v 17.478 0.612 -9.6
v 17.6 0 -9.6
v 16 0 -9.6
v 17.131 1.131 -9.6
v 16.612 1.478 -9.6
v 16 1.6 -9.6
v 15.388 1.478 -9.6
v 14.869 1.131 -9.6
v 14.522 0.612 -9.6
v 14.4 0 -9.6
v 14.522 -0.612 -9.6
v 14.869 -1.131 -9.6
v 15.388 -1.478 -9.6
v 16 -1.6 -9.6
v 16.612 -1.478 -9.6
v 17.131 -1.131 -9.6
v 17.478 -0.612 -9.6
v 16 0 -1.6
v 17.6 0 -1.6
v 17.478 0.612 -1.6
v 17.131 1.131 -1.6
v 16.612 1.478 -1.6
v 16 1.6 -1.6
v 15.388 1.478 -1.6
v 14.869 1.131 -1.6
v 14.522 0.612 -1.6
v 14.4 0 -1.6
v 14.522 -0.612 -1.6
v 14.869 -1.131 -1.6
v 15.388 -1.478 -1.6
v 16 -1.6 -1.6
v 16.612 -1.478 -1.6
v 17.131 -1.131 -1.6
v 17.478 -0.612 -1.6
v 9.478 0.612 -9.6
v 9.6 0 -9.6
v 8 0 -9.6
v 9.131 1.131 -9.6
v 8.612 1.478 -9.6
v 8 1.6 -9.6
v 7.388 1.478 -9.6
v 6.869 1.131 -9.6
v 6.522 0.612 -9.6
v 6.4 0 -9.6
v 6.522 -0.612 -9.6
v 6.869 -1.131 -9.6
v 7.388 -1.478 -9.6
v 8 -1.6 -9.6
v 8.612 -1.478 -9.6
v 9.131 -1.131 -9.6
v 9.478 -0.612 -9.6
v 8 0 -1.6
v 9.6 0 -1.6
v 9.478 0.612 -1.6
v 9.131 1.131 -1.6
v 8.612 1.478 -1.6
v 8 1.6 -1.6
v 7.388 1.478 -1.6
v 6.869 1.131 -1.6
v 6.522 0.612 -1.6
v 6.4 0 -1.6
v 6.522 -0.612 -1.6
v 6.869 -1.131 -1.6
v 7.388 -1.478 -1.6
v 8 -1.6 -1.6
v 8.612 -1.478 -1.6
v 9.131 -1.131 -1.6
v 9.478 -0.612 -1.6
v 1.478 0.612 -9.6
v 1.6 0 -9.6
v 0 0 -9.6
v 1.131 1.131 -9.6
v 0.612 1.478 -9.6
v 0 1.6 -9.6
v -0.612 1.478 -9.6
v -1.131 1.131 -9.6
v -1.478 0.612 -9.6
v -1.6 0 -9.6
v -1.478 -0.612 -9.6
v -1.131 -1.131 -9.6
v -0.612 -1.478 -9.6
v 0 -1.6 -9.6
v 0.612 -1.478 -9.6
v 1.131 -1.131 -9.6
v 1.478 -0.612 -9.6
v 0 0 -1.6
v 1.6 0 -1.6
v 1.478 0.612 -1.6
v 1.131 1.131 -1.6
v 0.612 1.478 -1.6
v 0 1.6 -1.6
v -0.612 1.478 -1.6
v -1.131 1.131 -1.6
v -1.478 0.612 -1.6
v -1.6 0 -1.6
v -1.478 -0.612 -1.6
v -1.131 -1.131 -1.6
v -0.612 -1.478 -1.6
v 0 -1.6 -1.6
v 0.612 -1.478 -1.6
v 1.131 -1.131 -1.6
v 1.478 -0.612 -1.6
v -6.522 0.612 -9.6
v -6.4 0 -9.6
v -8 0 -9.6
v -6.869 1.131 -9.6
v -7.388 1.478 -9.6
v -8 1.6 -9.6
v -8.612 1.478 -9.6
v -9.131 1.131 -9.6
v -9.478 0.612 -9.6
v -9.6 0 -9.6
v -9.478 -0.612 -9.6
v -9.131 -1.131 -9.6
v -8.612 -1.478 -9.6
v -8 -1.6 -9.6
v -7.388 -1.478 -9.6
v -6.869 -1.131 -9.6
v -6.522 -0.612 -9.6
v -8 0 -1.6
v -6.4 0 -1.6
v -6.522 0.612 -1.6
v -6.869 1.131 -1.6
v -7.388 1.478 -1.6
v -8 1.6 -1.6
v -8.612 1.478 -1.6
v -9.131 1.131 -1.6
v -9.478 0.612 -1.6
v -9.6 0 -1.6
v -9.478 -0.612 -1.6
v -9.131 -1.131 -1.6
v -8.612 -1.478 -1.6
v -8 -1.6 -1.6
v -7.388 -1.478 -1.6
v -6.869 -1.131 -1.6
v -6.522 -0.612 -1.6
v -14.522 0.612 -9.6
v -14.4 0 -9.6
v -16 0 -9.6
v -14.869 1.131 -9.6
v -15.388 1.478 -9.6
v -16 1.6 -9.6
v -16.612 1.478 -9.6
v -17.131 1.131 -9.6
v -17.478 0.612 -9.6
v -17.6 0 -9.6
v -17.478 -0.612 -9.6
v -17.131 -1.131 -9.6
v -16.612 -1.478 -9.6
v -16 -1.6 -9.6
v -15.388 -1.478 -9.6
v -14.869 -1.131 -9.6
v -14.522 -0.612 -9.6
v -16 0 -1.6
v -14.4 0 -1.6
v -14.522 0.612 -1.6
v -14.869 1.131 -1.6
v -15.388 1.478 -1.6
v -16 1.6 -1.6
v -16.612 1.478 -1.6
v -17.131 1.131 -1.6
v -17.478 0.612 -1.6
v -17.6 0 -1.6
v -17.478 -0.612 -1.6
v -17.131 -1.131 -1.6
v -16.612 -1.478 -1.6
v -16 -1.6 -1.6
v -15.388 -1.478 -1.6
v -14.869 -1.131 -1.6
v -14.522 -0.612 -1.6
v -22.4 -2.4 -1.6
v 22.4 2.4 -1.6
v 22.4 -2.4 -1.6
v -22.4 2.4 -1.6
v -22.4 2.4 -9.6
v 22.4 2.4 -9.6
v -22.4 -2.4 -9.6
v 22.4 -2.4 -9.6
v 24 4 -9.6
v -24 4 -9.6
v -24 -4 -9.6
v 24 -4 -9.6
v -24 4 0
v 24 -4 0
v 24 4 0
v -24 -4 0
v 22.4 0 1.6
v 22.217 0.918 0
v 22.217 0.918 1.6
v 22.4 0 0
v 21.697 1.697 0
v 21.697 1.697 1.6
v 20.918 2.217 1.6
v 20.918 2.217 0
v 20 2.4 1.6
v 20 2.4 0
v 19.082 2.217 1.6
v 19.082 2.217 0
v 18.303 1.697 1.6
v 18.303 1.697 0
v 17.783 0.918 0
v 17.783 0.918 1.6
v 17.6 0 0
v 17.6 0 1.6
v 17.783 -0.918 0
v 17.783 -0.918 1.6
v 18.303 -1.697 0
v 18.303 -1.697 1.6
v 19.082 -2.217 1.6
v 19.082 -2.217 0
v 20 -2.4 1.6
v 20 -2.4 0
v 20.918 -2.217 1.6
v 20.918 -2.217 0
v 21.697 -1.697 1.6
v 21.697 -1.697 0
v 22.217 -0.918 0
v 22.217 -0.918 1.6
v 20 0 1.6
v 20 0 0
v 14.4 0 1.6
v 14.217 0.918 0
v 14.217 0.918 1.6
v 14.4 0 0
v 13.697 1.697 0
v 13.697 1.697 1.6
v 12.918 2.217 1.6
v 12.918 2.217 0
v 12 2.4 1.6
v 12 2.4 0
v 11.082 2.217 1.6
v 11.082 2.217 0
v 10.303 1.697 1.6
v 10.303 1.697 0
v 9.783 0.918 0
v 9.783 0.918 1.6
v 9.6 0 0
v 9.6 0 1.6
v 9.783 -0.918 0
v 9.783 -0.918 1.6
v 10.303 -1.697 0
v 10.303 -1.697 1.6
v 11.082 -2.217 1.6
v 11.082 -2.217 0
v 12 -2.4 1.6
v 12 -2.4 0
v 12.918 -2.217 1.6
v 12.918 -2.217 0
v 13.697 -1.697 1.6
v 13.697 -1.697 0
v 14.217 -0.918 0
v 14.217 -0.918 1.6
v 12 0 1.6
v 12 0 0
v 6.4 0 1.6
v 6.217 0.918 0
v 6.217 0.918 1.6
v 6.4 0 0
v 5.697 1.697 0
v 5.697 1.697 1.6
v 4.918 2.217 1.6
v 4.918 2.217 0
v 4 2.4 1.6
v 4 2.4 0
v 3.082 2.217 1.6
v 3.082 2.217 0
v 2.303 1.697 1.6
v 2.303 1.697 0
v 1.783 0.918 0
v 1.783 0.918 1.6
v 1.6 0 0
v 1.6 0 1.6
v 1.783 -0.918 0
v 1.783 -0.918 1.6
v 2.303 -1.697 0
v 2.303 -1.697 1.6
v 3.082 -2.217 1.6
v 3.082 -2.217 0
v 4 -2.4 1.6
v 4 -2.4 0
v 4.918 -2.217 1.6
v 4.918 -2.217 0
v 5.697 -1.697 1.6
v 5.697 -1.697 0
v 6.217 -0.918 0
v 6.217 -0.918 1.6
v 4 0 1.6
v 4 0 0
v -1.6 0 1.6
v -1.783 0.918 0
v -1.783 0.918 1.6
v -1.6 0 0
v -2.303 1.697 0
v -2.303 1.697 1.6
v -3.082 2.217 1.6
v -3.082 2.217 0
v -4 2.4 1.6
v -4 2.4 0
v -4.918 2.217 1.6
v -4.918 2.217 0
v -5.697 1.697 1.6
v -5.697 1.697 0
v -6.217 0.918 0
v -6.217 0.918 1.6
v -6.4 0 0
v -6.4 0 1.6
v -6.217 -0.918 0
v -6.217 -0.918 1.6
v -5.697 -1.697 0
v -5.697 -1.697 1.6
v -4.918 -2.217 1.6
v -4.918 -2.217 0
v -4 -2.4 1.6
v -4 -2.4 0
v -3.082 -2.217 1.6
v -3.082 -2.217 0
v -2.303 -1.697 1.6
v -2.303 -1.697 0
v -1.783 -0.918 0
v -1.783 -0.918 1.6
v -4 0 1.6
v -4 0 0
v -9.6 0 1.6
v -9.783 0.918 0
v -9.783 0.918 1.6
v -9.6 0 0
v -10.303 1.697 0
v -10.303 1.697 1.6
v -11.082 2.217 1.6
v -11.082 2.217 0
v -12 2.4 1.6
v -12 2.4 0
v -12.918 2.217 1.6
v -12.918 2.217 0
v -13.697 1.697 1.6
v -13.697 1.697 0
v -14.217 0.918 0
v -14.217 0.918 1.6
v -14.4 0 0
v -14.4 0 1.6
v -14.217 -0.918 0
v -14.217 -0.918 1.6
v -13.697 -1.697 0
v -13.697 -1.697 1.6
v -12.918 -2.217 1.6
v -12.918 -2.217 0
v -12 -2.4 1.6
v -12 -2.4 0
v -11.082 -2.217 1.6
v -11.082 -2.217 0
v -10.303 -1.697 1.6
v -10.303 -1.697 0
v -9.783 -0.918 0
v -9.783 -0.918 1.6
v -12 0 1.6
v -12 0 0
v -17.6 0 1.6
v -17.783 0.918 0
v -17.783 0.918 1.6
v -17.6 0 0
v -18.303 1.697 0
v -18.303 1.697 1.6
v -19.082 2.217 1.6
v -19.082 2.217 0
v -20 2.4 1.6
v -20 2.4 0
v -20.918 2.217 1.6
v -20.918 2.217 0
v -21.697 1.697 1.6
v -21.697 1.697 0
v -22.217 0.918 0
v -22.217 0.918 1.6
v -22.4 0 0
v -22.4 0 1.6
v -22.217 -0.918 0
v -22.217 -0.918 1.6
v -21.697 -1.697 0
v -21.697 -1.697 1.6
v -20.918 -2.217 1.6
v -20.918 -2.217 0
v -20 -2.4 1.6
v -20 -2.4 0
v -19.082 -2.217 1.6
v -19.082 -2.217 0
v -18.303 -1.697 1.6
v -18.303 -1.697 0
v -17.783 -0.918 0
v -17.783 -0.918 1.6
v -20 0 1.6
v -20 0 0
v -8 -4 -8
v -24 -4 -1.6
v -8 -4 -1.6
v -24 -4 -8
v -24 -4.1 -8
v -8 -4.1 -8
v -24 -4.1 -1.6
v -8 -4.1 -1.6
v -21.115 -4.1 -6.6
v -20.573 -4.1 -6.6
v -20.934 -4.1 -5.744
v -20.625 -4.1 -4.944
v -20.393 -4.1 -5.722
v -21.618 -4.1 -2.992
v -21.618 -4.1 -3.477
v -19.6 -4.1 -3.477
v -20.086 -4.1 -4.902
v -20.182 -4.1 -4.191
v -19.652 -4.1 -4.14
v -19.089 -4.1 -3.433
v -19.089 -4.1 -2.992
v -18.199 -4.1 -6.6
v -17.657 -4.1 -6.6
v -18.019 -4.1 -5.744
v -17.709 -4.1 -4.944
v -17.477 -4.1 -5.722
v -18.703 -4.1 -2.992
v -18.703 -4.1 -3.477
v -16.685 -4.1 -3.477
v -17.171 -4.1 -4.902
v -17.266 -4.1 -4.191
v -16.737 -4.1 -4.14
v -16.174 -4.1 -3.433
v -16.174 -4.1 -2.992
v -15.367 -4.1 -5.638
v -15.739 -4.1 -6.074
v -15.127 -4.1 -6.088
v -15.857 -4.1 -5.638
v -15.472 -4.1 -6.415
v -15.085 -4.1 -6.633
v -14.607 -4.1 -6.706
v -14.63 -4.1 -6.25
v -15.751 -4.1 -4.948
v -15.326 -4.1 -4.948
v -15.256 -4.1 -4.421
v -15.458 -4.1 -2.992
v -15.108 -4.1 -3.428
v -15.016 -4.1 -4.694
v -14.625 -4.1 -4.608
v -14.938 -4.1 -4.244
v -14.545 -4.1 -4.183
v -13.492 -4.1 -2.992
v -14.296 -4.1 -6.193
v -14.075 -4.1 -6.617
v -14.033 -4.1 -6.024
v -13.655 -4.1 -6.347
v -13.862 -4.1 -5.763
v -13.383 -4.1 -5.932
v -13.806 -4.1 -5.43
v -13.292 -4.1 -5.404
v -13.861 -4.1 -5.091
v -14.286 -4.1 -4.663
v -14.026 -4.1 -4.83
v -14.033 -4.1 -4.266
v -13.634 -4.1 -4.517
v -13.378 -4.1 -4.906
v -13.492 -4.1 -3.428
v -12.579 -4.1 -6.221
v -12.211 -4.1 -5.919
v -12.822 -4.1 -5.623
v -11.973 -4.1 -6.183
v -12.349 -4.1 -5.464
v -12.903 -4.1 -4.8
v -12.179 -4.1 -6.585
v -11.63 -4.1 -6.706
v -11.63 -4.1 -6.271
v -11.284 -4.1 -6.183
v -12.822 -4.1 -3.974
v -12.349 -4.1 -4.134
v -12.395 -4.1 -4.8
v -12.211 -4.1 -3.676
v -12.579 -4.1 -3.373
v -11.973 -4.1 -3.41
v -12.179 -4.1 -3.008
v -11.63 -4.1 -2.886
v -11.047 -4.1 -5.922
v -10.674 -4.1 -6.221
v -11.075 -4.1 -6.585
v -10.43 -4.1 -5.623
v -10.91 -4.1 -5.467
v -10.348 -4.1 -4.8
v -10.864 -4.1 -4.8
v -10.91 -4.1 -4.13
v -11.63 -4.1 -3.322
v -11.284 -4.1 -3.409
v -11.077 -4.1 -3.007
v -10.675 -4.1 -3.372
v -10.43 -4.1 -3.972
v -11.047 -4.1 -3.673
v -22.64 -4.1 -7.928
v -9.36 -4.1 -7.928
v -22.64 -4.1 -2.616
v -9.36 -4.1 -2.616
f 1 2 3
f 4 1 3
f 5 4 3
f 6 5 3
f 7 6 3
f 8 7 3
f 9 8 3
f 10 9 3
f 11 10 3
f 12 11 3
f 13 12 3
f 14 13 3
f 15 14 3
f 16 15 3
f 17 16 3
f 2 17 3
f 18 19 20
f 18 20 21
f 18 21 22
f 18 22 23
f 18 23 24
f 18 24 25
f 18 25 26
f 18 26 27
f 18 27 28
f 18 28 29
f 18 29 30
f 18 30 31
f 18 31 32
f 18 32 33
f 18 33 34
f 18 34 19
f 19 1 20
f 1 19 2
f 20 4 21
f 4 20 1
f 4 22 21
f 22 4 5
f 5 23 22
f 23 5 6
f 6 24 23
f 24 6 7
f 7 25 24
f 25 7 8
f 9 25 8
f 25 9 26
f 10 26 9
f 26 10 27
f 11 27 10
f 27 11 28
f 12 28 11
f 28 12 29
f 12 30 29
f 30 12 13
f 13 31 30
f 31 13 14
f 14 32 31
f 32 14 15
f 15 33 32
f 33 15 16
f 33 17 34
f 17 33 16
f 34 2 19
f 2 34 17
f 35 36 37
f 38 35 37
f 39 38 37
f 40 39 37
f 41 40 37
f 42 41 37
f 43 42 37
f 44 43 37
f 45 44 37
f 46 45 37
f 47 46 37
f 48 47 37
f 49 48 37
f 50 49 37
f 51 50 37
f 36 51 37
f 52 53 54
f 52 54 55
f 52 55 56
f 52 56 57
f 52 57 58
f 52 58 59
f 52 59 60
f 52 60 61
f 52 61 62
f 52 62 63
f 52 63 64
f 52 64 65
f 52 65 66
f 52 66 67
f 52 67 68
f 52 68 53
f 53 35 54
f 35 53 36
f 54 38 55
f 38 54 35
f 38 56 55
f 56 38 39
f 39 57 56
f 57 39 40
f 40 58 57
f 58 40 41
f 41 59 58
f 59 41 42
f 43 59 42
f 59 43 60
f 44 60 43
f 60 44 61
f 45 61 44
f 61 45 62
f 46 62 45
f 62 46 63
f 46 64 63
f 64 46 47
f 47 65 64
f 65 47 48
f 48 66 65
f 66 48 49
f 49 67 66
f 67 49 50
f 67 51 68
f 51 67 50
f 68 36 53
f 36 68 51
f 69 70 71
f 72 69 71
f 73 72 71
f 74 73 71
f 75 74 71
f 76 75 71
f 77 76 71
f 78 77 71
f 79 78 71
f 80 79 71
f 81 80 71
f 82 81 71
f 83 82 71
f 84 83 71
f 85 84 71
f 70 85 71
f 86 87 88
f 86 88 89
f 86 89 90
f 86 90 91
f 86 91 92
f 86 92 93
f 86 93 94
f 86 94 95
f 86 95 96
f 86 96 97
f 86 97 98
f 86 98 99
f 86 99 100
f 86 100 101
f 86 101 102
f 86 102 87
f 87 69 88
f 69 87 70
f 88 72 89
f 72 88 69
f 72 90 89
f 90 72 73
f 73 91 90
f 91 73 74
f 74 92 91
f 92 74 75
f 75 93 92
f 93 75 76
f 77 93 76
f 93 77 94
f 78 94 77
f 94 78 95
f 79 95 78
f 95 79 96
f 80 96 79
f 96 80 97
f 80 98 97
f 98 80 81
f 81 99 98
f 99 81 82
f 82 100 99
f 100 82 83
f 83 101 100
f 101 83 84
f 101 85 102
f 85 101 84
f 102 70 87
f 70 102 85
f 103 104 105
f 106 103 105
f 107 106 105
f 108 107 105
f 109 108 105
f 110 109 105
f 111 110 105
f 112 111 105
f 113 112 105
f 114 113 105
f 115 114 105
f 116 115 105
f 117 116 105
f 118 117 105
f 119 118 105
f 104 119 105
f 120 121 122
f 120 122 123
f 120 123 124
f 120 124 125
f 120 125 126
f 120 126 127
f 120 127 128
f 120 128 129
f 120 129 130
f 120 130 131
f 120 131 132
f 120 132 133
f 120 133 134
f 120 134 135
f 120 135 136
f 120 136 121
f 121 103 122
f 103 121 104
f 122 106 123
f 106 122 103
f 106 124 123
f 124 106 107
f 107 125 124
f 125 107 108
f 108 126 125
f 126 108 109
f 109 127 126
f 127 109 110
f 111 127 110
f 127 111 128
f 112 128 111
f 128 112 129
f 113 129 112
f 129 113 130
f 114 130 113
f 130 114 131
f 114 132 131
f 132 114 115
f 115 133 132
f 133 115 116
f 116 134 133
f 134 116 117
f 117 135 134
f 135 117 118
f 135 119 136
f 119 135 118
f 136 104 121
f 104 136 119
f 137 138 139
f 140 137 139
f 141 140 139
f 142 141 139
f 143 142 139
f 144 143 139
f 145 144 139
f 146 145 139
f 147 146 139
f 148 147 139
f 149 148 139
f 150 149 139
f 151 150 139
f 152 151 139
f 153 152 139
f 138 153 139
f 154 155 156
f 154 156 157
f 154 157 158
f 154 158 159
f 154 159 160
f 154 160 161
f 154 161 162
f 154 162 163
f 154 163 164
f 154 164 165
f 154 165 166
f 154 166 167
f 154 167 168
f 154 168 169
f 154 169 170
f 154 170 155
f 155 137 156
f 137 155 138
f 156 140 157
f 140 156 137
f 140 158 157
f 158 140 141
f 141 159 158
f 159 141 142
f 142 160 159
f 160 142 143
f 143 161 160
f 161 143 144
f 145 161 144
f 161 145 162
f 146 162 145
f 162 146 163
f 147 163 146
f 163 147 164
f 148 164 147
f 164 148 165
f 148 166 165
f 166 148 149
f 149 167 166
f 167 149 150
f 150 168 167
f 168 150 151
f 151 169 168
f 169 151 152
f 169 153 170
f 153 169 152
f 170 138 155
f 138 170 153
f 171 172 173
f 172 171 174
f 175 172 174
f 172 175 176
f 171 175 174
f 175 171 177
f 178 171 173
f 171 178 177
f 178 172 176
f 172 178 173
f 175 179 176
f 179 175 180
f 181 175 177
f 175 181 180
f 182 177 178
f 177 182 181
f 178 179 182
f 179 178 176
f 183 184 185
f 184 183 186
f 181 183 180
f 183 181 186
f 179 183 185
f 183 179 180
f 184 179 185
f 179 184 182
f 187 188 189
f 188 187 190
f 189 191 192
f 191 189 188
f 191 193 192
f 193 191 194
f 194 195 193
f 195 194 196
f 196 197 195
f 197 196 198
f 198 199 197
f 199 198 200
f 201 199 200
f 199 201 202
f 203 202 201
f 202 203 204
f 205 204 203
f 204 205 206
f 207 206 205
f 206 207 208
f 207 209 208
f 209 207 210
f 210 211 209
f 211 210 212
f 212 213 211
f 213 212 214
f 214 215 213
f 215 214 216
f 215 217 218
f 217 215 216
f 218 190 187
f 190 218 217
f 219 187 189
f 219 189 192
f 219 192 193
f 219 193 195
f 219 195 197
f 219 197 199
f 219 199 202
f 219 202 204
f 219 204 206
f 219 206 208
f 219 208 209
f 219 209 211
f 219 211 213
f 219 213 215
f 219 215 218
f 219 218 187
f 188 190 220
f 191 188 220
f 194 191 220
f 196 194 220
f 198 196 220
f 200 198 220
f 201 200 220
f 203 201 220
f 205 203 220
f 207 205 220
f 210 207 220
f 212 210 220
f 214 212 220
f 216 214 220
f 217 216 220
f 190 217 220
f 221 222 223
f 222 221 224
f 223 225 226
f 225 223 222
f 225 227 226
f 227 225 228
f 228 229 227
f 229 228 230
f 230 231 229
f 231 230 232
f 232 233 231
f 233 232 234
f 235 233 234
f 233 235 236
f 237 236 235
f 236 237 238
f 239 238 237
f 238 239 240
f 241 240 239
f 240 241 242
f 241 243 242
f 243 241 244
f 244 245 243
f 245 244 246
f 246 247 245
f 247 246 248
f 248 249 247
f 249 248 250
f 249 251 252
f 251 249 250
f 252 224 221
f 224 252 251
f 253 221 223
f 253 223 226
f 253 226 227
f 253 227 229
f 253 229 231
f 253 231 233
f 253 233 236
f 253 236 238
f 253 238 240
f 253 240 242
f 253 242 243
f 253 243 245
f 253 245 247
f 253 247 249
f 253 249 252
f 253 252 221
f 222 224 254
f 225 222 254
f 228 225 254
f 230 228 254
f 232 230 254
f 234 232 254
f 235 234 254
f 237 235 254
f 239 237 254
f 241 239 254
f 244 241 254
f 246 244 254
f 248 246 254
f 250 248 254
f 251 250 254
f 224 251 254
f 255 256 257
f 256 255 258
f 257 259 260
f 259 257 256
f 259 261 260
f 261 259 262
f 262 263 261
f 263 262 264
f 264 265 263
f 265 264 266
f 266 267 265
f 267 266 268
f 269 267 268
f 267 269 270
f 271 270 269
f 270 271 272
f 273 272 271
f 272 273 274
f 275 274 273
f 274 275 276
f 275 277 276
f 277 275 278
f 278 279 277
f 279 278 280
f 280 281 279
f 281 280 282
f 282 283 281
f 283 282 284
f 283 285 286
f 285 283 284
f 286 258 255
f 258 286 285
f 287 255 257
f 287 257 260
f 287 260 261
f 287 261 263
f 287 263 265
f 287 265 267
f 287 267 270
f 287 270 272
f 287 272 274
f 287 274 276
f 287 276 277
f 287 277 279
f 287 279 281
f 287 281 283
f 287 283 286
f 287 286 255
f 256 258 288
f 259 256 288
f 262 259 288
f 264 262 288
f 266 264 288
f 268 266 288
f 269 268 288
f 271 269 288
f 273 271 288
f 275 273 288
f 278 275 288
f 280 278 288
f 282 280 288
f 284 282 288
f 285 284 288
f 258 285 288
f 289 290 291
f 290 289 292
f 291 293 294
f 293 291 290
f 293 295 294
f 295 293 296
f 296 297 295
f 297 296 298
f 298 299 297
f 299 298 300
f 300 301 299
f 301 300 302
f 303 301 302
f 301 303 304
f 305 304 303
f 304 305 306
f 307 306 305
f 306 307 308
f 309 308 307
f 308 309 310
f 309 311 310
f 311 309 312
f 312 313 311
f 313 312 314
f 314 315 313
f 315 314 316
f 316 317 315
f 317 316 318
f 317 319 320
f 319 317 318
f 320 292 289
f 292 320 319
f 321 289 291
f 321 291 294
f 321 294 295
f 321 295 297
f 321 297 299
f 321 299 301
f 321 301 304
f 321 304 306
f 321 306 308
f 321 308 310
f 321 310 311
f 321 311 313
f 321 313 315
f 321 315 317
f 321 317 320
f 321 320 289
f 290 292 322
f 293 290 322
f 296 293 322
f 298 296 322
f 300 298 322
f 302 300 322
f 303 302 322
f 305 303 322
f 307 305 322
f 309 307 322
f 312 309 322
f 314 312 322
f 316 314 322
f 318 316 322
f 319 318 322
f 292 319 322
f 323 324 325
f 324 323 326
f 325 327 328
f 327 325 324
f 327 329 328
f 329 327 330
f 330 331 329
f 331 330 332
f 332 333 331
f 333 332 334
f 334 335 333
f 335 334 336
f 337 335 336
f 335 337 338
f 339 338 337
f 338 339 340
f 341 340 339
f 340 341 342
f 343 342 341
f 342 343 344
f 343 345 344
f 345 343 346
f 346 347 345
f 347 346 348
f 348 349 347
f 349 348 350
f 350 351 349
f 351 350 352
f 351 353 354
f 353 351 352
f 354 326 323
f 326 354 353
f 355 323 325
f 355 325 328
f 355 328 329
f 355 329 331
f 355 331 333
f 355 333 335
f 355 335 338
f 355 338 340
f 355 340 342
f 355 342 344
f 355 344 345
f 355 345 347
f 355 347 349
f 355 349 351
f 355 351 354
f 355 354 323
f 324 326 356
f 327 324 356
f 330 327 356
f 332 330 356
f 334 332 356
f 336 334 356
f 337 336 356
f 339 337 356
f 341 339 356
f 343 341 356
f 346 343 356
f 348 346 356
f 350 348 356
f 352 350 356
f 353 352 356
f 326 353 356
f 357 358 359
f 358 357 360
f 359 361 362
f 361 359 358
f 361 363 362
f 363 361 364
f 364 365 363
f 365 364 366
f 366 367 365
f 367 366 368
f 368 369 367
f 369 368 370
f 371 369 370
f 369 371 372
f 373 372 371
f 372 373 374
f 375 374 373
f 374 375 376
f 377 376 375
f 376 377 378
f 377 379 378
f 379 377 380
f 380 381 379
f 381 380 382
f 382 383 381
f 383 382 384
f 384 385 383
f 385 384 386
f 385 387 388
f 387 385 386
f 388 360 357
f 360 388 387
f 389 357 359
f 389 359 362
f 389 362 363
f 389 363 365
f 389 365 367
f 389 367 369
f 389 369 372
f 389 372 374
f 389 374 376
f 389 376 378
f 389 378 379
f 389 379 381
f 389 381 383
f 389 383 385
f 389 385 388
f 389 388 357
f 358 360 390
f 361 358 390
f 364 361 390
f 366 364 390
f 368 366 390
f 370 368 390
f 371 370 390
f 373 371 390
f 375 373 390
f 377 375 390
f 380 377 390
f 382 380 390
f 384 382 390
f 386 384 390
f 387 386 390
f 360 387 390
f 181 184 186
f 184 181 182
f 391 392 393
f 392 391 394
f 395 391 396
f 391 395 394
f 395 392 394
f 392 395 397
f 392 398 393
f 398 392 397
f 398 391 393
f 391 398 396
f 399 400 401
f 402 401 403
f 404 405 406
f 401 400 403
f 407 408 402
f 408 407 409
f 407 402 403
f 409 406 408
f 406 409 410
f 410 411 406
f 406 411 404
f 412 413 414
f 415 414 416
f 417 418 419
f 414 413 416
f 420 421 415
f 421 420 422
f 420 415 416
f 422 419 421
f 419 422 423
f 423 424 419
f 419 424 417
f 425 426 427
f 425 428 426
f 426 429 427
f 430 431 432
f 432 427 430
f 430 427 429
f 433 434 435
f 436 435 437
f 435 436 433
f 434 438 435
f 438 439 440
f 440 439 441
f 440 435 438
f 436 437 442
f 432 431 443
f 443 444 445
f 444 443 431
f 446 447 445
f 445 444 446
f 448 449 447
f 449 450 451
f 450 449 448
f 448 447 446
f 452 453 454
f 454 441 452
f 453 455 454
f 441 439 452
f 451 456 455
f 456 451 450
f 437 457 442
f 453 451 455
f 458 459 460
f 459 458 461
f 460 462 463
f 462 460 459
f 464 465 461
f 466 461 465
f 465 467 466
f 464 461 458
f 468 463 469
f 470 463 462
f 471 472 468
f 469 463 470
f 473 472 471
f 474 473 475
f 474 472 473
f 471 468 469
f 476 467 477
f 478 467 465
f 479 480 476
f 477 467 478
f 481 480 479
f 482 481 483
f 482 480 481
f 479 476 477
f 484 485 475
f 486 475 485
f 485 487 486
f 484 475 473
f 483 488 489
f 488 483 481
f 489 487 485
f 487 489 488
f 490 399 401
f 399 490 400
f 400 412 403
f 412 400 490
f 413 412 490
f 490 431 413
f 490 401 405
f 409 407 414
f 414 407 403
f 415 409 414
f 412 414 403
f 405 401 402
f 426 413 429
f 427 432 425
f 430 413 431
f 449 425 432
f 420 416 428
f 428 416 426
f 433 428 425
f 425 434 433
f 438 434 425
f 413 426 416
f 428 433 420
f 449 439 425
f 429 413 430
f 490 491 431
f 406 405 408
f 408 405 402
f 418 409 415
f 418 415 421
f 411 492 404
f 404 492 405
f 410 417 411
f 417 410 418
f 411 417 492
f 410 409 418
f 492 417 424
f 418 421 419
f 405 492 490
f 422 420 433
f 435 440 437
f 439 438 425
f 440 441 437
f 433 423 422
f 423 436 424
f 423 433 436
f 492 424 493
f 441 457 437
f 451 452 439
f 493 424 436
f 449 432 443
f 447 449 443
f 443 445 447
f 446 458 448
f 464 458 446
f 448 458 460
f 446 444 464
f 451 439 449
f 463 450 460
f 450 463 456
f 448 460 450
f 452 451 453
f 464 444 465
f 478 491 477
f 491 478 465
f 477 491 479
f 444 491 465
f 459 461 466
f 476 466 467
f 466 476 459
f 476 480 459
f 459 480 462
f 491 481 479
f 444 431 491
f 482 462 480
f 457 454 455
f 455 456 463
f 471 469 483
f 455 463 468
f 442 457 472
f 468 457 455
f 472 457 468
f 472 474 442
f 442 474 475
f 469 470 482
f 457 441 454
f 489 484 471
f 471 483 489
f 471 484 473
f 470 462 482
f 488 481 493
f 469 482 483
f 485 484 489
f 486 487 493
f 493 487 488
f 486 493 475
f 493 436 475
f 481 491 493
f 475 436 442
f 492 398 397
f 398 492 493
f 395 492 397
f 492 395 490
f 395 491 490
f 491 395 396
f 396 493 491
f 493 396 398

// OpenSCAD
// file: ../p/4-4edge.scad
use <../lib.scad>
function ldraw_lib__4_4edge() = [
// 0 Circle 1.0
// 0 Name: 4-4edge.dat
// 0 Author: James Jessiman
// 0 !LDRAW_ORG Primitive UPDATE 2017-01
// 0 !LICENSE Licensed under CC BY 2.0 and CC BY 4.0 : see CAreadme.txt
// 
// 0 BFC CERTIFY CCW
  [0,"BFC","CERTIFY"],
  [0,"BFC","CCW"],
// 
// 0 !HISTORY 1998-12-15 [PTadmin] Official Update 1998-10
// 0 !HISTORY 2005-12-28 [PTadmin] Official Update 2005-01
// 0 !HISTORY 2007-06-24 [PTadmin] Header formatted for Contributor Agreement
// 0 !HISTORY 2008-07-01 [PTadmin] Official Update 2008-01
// 0 !HISTORY 2017-01-15 [Steffen] BFCed
// 0 !HISTORY 2017-12-30 [PTadmin] Official Update 2017-01
// 
// 
// 2 24 1 0 0 0.9239 0 0.3827
  [2,24,1,0,0,0.9239,0,0.3827],
// 2 24 0.9239 0 0.3827 0.7071 0 0.7071
  [2,24,0.9239,0,0.3827,0.7071,0,0.7071],
// 2 24 0.7071 0 0.7071 0.3827 0 0.9239
  [2,24,0.7071,0,0.7071,0.3827,0,0.9239],
// 2 24 0.3827 0 0.9239 0 0 1
  [2,24,0.3827,0,0.9239,0,0,1],
// 2 24 0 0 1 -0.3827 0 0.9239
  [2,24,0,0,1,-0.3827,0,0.9239],
// 2 24 -0.3827 0 0.9239 -0.7071 0 0.7071
  [2,24,-0.3827,0,0.9239,-0.7071,0,0.7071],
// 2 24 -0.7071 0 0.7071 -0.9239 0 0.3827
  [2,24,-0.7071,0,0.7071,-0.9239,0,0.3827],
// 2 24 -0.9239 0 0.3827 -1 0 -0
  [2,24,-0.9239,0,0.3827,-1,0,-0],
// 2 24 -1 0 -0 -0.9239 0 -0.3827
  [2,24,-1,0,-0,-0.9239,0,-0.3827],
// 2 24 -0.9239 0 -0.3827 -0.7071 0 -0.7071
  [2,24,-0.9239,0,-0.3827,-0.7071,0,-0.7071],
// 2 24 -0.7071 0 -0.7071 -0.3827 0 -0.9239
  [2,24,-0.7071,0,-0.7071,-0.3827,0,-0.9239],
// 2 24 -0.3827 0 -0.9239 0 0 -1
  [2,24,-0.3827,0,-0.9239,0,0,-1],
// 2 24 0 0 -1 0.3827 0 -0.9239
  [2,24,0,0,-1,0.3827,0,-0.9239],
// 2 24 0.3827 0 -0.9239 0.7071 0 -0.7071
  [2,24,0.3827,0,-0.9239,0.7071,0,-0.7071],
// 2 24 0.7071 0 -0.7071 0.9239 0 -0.3827
  [2,24,0.7071,0,-0.7071,0.9239,0,-0.3827],
// 2 24 0.9239 0 -0.3827 1 0 0
  [2,24,0.9239,0,-0.3827,1,0,0],
];
module ldraw_lib__4_4edge(step=0, col=false, unit=2/5, alt=false, line=0.2, solid=!$preview)
    makepoly(ldraw_lib__4_4edge(), step=step, col=col, unit=unit, alt=alt, line=line, solid=solid);
ldraw_lib__4_4edge(line=0.2);
// file: ../p/4-4disc.scad
use <../lib.scad>
function ldraw_lib__4_4disc() = [
// 0 Disc 1.0
// 0 Name: 4-4disc.dat
// 0 Author: James Jessiman
// 0 !LDRAW_ORG Primitive UPDATE 2002-02
// 0 !LICENSE Licensed under CC BY 2.0 and CC BY 4.0 : see CAreadme.txt
// 
// 0 BFC CERTIFY CCW
  [0,"BFC","CERTIFY"],
  [0,"BFC","CCW"],
// 
// 0 !HISTORY 1998-12-15 [PTadmin] Official Update 1998-10
// 0 !HISTORY 2002-03-23 [sbliss] Added BFC statement
// 0 !HISTORY 2002-04-25 [PTadmin] Official Update 2002-02
// 0 !HISTORY 2007-06-24 [PTadmin] Header formatted for Contributor Agreement
// 0 !HISTORY 2008-07-01 [PTadmin] Official Update 2008-01
// 
// 
// 3 16 0 0 0 1 0 0 0.9239 0 0.3827
  [3,16,0,0,0,1,0,0,0.9239,0,0.3827],
// 3 16 0 0 0 0.9239 0 0.3827 0.7071 0 0.7071
  [3,16,0,0,0,0.9239,0,0.3827,0.7071,0,0.7071],
// 3 16 0 0 0 0.7071 0 0.7071 0.3827 0 0.9239
  [3,16,0,0,0,0.7071,0,0.7071,0.3827,0,0.9239],
// 3 16 0 0 0 0.3827 0 0.9239 0 0 1
  [3,16,0,0,0,0.3827,0,0.9239,0,0,1],
// 3 16 0 0 0 0 0 1 -0.3827 0 0.9239
  [3,16,0,0,0,0,0,1,-0.3827,0,0.9239],
// 3 16 0 0 0 -0.3827 0 0.9239 -0.7071 0 0.7071
  [3,16,0,0,0,-0.3827,0,0.9239,-0.7071,0,0.7071],
// 3 16 0 0 0 -0.7071 0 0.7071 -0.9239 0 0.3827
  [3,16,0,0,0,-0.7071,0,0.7071,-0.9239,0,0.3827],
// 3 16 0 0 0 -0.9239 0 0.3827 -1 0 -0
  [3,16,0,0,0,-0.9239,0,0.3827,-1,0,-0],
// 3 16 0 0 0 -1 0 -0 -0.9239 0 -0.3827
  [3,16,0,0,0,-1,0,-0,-0.9239,0,-0.3827],
// 3 16 0 0 0 -0.9239 0 -0.3827 -0.7071 0 -0.7071
  [3,16,0,0,0,-0.9239,0,-0.3827,-0.7071,0,-0.7071],
// 3 16 0 0 0 -0.7071 0 -0.7071 -0.3827 0 -0.9239
  [3,16,0,0,0,-0.7071,0,-0.7071,-0.3827,0,-0.9239],
// 3 16 0 0 0 -0.3827 0 -0.9239 0 0 -1
  [3,16,0,0,0,-0.3827,0,-0.9239,0,0,-1],
// 3 16 0 0 0 0 0 -1 0.3827 0 -0.9239
  [3,16,0,0,0,0,0,-1,0.3827,0,-0.9239],
// 3 16 0 0 0 0.3827 0 -0.9239 0.7071 0 -0.7071
  [3,16,0,0,0,0.3827,0,-0.9239,0.7071,0,-0.7071],
// 3 16 0 0 0 0.7071 0 -0.7071 0.9239 0 -0.3827
  [3,16,0,0,0,0.7071,0,-0.7071,0.9239,0,-0.3827],
// 3 16 0 0 0 0.9239 0 -0.3827 1 0 0
  [3,16,0,0,0,0.9239,0,-0.3827,1,0,0],
// 0
];
module ldraw_lib__4_4disc(step=0, col=false, unit=2/5, alt=false, line=0.2, solid=!$preview)
    makepoly(ldraw_lib__4_4disc(), step=step, col=col, unit=unit, alt=alt, line=line, solid=solid);
ldraw_lib__4_4disc(line=0.2);
// file: ../p/4-4cyli.scad
use <../lib.scad>
$fa=1; $fs=0.2;
function ldraw_lib__4_4cyli(realsolid=false) = [
// 0 Cylinder 1.0
// 0 Name: 4-4cyli.dat
// 0 Author: James Jessiman
// 0 !LDRAW_ORG Primitive UPDATE 2005-01
// 0 !LICENSE Licensed under CC BY 2.0 and CC BY 4.0 : see CAreadme.txt
// 
// 0 BFC CERTIFY CCW
  [0,"BFC","CERTIFY"],
  [0,"BFC","CCW"],
// 
// 0 !HISTORY 1998-12-15 [PTadmin] Official Update 1998-10
// 0 !HISTORY 2002-03-23 [sbliss] Added BFC statement; merged headers from files in distributions LDraw 0.27 and Complete.
// 0 !HISTORY 2002-04-25 [PTadmin] Official Update 2002-02
// 0 !HISTORY 2004-12-14 [guyvivan] BFC CCW
// 0 !HISTORY 2005-12-28 [PTadmin] Official Update 2005-01
// 0 !HISTORY 2007-06-24 [PTadmin] Header formatted for Contributor Agreement
// 0 !HISTORY 2008-07-01 [PTadmin] Official Update 2008-01
// 
// 
// 4 16 1 1 0 0.9239 1 0.3827 0.9239 0 0.3827 1 0 0
  [4,16,1,1,0,0.9239,1,0.3827,0.9239,0,0.3827,1,0,0],
// 5 24 1 0 0 1 1 0 0.9239 0 0.3827 0.9239 0 -0.3827
  [5,24,1,0,0,1,1,0,0.9239,0,0.3827,0.9239,0,-0.3827],
// 4 16 0.9239 1 0.3827 0.7071 1 0.7071 0.7071 0 0.7071 0.9239 0 0.3827
  [4,16,0.9239,1,0.3827,0.7071,1,0.7071,0.7071,0,0.7071,0.9239,0,0.3827],
// 5 24 0.9239 0 0.3827 0.9239 1 0.3827 0.7071 0 0.7071 1 0 0
  [5,24,0.9239,0,0.3827,0.9239,1,0.3827,0.7071,0,0.7071,1,0,0],
// 4 16 0.7071 1 0.7071 0.3827 1 0.9239 0.3827 0 0.9239 0.7071 0 0.7071
  [4,16,0.7071,1,0.7071,0.3827,1,0.9239,0.3827,0,0.9239,0.7071,0,0.7071],
// 5 24 0.7071 0 0.7071 0.7071 1 0.7071 0.3827 0 0.9239 0.9239 0 0.3827
  [5,24,0.7071,0,0.7071,0.7071,1,0.7071,0.3827,0,0.9239,0.9239,0,0.3827],
// 4 16 0.3827 1 0.9239 0 1 1 0 0 1 0.3827 0 0.9239
  [4,16,0.3827,1,0.9239,0,1,1,0,0,1,0.3827,0,0.9239],
// 5 24 0.3827 0 0.9239 0.3827 1 0.9239 0 0 1 0.7071 0 0.7071
  [5,24,0.3827,0,0.9239,0.3827,1,0.9239,0,0,1,0.7071,0,0.7071],
// 4 16 0 1 1 -0.3827 1 0.9239 -0.3827 0 0.9239 0 0 1
  [4,16,0,1,1,-0.3827,1,0.9239,-0.3827,0,0.9239,0,0,1],
// 5 24 0 0 1 0 1 1 -0.3827 0 0.9239 0.3827 0 0.9239
  [5,24,0,0,1,0,1,1,-0.3827,0,0.9239,0.3827,0,0.9239],
// 4 16 -0.3827 1 0.9239 -0.7071 1 0.7071 -0.7071 0 0.7071 -0.3827 0 0.9239
  [4,16,-0.3827,1,0.9239,-0.7071,1,0.7071,-0.7071,0,0.7071,-0.3827,0,0.9239],
// 5 24 -0.3827 0 0.9239 -0.3827 1 0.9239 -0.7071 0 0.7071 0 0 1
  [5,24,-0.3827,0,0.9239,-0.3827,1,0.9239,-0.7071,0,0.7071,0,0,1],
// 4 16 -0.7071 1 0.7071 -0.9239 1 0.3827 -0.9239 0 0.3827 -0.7071 0 0.7071
  [4,16,-0.7071,1,0.7071,-0.9239,1,0.3827,-0.9239,0,0.3827,-0.7071,0,0.7071],
// 5 24 -0.7071 0 0.7071 -0.7071 1 0.7071 -0.9239 0 0.3827 -0.3827 0 0.9239
  [5,24,-0.7071,0,0.7071,-0.7071,1,0.7071,-0.9239,0,0.3827,-0.3827,0,0.9239],
// 4 16 -0.9239 1 0.3827 -1 1 0 -1 0 0 -0.9239 0 0.3827
  [4,16,-0.9239,1,0.3827,-1,1,0,-1,0,0,-0.9239,0,0.3827],
// 5 24 -0.9239 0 0.3827 -0.9239 1 0.3827 -1 0 0 -0.7071 0 0.7071
  [5,24,-0.9239,0,0.3827,-0.9239,1,0.3827,-1,0,0,-0.7071,0,0.7071],
// 4 16 -1 1 0 -0.9239 1 -0.3827 -0.9239 0 -0.3827 -1 0 0
  [4,16,-1,1,0,-0.9239,1,-0.3827,-0.9239,0,-0.3827,-1,0,0],
// 5 24 -1 0 0 -1 1 0 -0.9239 0 -0.3827 -0.9239 0 0.3827
  [5,24,-1,0,0,-1,1,0,-0.9239,0,-0.3827,-0.9239,0,0.3827],
// 4 16 -0.9239 1 -0.3827 -0.7071 1 -0.7071 -0.7071 0 -0.7071 -0.9239 0 -0.3827
  [4,16,-0.9239,1,-0.3827,-0.7071,1,-0.7071,-0.7071,0,-0.7071,-0.9239,0,-0.3827],
// 5 24 -0.9239 0 -0.3827 -0.9239 1 -0.3827 -0.7071 0 -0.7071 -1 0 0
  [5,24,-0.9239,0,-0.3827,-0.9239,1,-0.3827,-0.7071,0,-0.7071,-1,0,0],
// 4 16 -0.7071 1 -0.7071 -0.3827 1 -0.9239 -0.3827 0 -0.9239 -0.7071 0 -0.7071
  [4,16,-0.7071,1,-0.7071,-0.3827,1,-0.9239,-0.3827,0,-0.9239,-0.7071,0,-0.7071],
// 5 24 -0.7071 0 -0.7071 -0.7071 1 -0.7071 -0.3827 0 -0.9239 -0.9239 0 -0.3827
  [5,24,-0.7071,0,-0.7071,-0.7071,1,-0.7071,-0.3827,0,-0.9239,-0.9239,0,-0.3827],
// 4 16 -0.3827 1 -0.9239 0 1 -1 0 0 -1 -0.3827 0 -0.9239
  [4,16,-0.3827,1,-0.9239,0,1,-1,0,0,-1,-0.3827,0,-0.9239],
// 5 24 -0.3827 0 -0.9239 -0.3827 1 -0.9239 0 0 -1 -0.7071 0 -0.7071
  [5,24,-0.3827,0,-0.9239,-0.3827,1,-0.9239,0,0,-1,-0.7071,0,-0.7071],
// 4 16 0 1 -1 0.3827 1 -0.9239 0.3827 0 -0.9239 0 0 -1
  [4,16,0,1,-1,0.3827,1,-0.9239,0.3827,0,-0.9239,0,0,-1],
// 5 24 0 0 -1 0 1 -1 0.3827 0 -0.9239 -0.3827 0 -0.9239
  [5,24,0,0,-1,0,1,-1,0.3827,0,-0.9239,-0.3827,0,-0.9239],
// 4 16 0.3827 1 -0.9239 0.7071 1 -0.7071 0.7071 0 -0.7071 0.3827 0 -0.9239
  [4,16,0.3827,1,-0.9239,0.7071,1,-0.7071,0.7071,0,-0.7071,0.3827,0,-0.9239],
// 5 24 0.3827 0 -0.9239 0.3827 1 -0.9239 0.7071 0 -0.7071 0 0 -1
  [5,24,0.3827,0,-0.9239,0.3827,1,-0.9239,0.7071,0,-0.7071,0,0,-1],
// 4 16 0.7071 1 -0.7071 0.9239 1 -0.3827 0.9239 0 -0.3827 0.7071 0 -0.7071
  [4,16,0.7071,1,-0.7071,0.9239,1,-0.3827,0.9239,0,-0.3827,0.7071,0,-0.7071],
// 5 24 0.7071 0 -0.7071 0.7071 1 -0.7071 0.9239 0 -0.3827 0.3827 0 -0.9239
  [5,24,0.7071,0,-0.7071,0.7071,1,-0.7071,0.9239,0,-0.3827,0.3827,0,-0.9239],
// 4 16 0.9239 1 -0.3827 1 1 0 1 0 0 0.9239 0 -0.3827
  [4,16,0.9239,1,-0.3827,1,1,0,1,0,0,0.9239,0,-0.3827],
// 5 24 0.9239 0 -0.3827 0.9239 1 -0.3827 1 0 0 0.7071 0 -0.7071
  [5,24,0.9239,0,-0.3827,0.9239,1,-0.3827,1,0,0,0.7071,0,-0.7071],
// 0
];
module ldraw_lib__4_4cyli(step=0, col=false, unit=2/5, alt=false, line=0.2, solid=!$preview)
    makepoly(ldraw_lib__4_4cyli(solid), step=step, col=col, unit=unit, alt=alt, line=line, solid=solid);
ldraw_lib__4_4cyli(line=0.2);
// file: ../p/stud3.scad
use <../lib.scad>
use <4-4cyli.scad>
use <4-4disc.scad>
use <4-4edge.scad>
function ldraw_lib__stud3() = [
// 0 Stud Tube Solid
// 0 Name: stud3.dat
// 0 Author: James Jessiman
// 0 !LDRAW_ORG Primitive UPDATE 2012-01
// 0 !LICENSE Licensed under CC BY 4.0 : see CAreadme.txt
// 
// 0 BFC CERTIFY CCW
  [0,"BFC","CERTIFY"],
  [0,"BFC","CCW"],
// 
// 0 !HISTORY 2002-04-04 [sbliss] Modified for BFC compliance
// 0 !HISTORY 2002-04-25 [PTadmin] Official Update 2002-02
// 0 !HISTORY 2007-06-24 [PTadmin] Header formatted for Contributor Agreement
// 0 !HISTORY 2008-07-01 [PTadmin] Official Update 2008-01
// 0 !HISTORY 2012-02-16 [Philo] Changed to CCW
// 0 !HISTORY 2012-03-30 [PTadmin] Official Update 2012-01
// 
// 
// 1 16 0 -4 0 4 0 0 0 1 0 0 0 4 4-4edge.dat
  [1,16,0,-4,0,4,0,0,0,1,0,0,0,4, ldraw_lib__4_4edge()],
// 1 16 0 0 0 4 0 0 0 1 0 0 0 4 4-4edge.dat
  [1,16,0,0,0,4,0,0,0,1,0,0,0,4, ldraw_lib__4_4edge()],
// 1 16 0 -4 0 4 0 0 0 1 0 0 0 4 4-4disc.dat
  [1,16,0,-4,0,4,0,0,0,1,0,0,0,4, ldraw_lib__4_4disc()],
  [-1,16,0,0,0,4,0,0,0,-1,0,0,0,4, ldraw_lib__4_4disc()],
// 1 16 0 -4 0 4 0 0 0 4 0 0 0 4 4-4cyli.dat
  [1,16,0,-4,0,4,0,0,0,4,0,0,0,4, ldraw_lib__4_4cyli()],
];
module ldraw_lib__stud3(step=0, col=false, unit=2/5, alt=false, line=0.2, solid=!$preview)
    makepoly(ldraw_lib__stud3(), step=step, col=col, unit=unit, alt=alt, line=line, solid=solid);
ldraw_lib__stud3(line=0.2);
// file: ../p/stud.scad
use <../lib.scad>
use <4-4cyli.scad>
use <4-4disc.scad>
use <4-4edge.scad>
function ldraw_lib__stud() = [
// 0 Stud
// 0 Name: stud.dat
// 0 Author: James Jessiman
// 0 !LDRAW_ORG Primitive UPDATE 2012-01
// 0 !LICENSE Licensed under CC BY 4.0 : see CAreadme.txt
// 
// 0 BFC CERTIFY CCW
  [0,"BFC","CERTIFY"],
  [0,"BFC","CCW"],
// 
// 0 !HISTORY 2002-04-04 [sbliss] Modified for BFC compliance
// 0 !HISTORY 2002-04-25 [PTadmin] Official Update 2002-02
// 0 !HISTORY 2007-06-24 [PTadmin] Header formatted for Contributor Agreement
// 0 !HISTORY 2008-07-01 [PTadmin] Official Update 2008-01
// 0 !HISTORY 2012-02-16 [Philo] Changed to CCW
// 0 !HISTORY 2012-03-30 [PTadmin] Official Update 2012-01
// 
// 
// 1 16 0 0 0 6 0 0 0 1 0 0 0 6 4-4edge.dat
  [1,16,0,0,0,6,0,0,0,1,0,0,0,6, ldraw_lib__4_4edge()],
// 1 16 0 -4 0 6 0 0 0 1 0 0 0 6 4-4edge.dat
  [1,16,0,-4,0,6,0,0,0,1,0,0,0,6, ldraw_lib__4_4edge()],
// 1 16 0 0 0 6 0 0 0 -4 0 0 0 6 4-4cyli.dat
  [1,16,0,0,0,6,0,0,0,-4,0,0,0,6, ldraw_lib__4_4cyli()],
// 1 16 0 -4 0 6 0 0 0 1 0 0 0 6 4-4disc.dat
  [1,16,0,-4,0,6,0,0,0,1,0,0,0,6, ldraw_lib__4_4disc()],
  [-1,16,0,0,0,6,0,0,0,-1,0,0,0,6, ldraw_lib__4_4disc()],
];
module ldraw_lib__stud(step=0, col=false, unit=2/5, alt=false, line=0.2, solid=!$preview)
    makepoly(ldraw_lib__stud(), step=step, col=col, unit=unit, alt=alt, line=line, solid=solid);
ldraw_lib__stud(line=0.2);
// file: ../p/box5.scad
use <../lib.scad>
function ldraw_lib__box5() = [
// 0 Box with 5 Faces and All Edges
// 0 Name: box5.dat
// 0 Author: James Jessiman
// 0 !LDRAW_ORG Primitive UPDATE 2012-01
// 0 !LICENSE Licensed under CC BY 2.0 and CC BY 4.0 : see CAreadme.txt
// 
// 0 BFC CERTIFY CCW
  [0,"BFC","CERTIFY"],
  [0,"BFC","CCW"],
// 
// 0 !HISTORY 2002-04-03 [sbliss] Modified for BFC compliance
// 0 !HISTORY 2002-04-25 [PTadmin] Official Update 2002-02
// 0 !HISTORY 2007-06-24 [PTadmin] Header formatted for Contributor Agreement
// 0 !HISTORY 2008-07-01 [PTadmin] Official Update 2008-01
// 0 !HISTORY 2012-02-16 [Philo] Changed to CCW
// 0 !HISTORY 2012-03-30 [PTadmin] Official Update 2012-01
// 
// 
// 2 24 1 1 1 -1 1 1
  [2,24,1,1,1,-1,1,1],
// 2 24 -1 1 1 -1 1 -1
  [2,24,-1,1,1,-1,1,-1],
// 2 24 -1 1 -1 1 1 -1
  [2,24,-1,1,-1,1,1,-1],
// 2 24 1 1 -1 1 1 1
  [2,24,1,1,-1,1,1,1],
// 2 24 1 0 1 -1 0 1
  [2,24,1,0,1,-1,0,1],
// 2 24 -1 0 1 -1 0 -1
  [2,24,-1,0,1,-1,0,-1],
// 2 24 -1 0 -1 1 0 -1
  [2,24,-1,0,-1,1,0,-1],
// 2 24 1 0 -1 1 0 1
  [2,24,1,0,-1,1,0,1],
// 2 24 1 0 1 1 1 1
  [2,24,1,0,1,1,1,1],
// 2 24 -1 0 1 -1 1 1
  [2,24,-1,0,1,-1,1,1],
// 2 24 1 0 -1 1 1 -1
  [2,24,1,0,-1,1,1,-1],
// 2 24 -1 0 -1 -1 1 -1
  [2,24,-1,0,-1,-1,1,-1],
// 4 16 -1 1 1 1 1 1 1 1 -1 -1 1 -1
  [4,16,-1,1,1,1,1,1,1,1,-1,-1,1,-1],
// 4 16 -1 1 1 -1 0 1 1 0 1 1 1 1
  [4,16,-1,1,1,-1,0,1,1,0,1,1,1,1],
// 4 16 -1 1 -1 -1 0 -1 -1 0 1 -1 1 1
  [4,16,-1,1,-1,-1,0,-1,-1,0,1,-1,1,1],
// 4 16 1 1 -1 1 0 -1 -1 0 -1 -1 1 -1
  [4,16,1,1,-1,1,0,-1,-1,0,-1,-1,1,-1],
// 4 16 1 1 1 1 0 1 1 0 -1 1 1 -1
  [4,16,1,1,1,1,0,1,1,0,-1,1,1,-1],
];
makepoly(ldraw_lib__box5(), line=0.2);
// file: s/3009s01.scad
use <../../lib.scad>
use <../../p/box5.scad>
use <../../p/stud.scad>
use <../../p/stud3.scad>
$fa=1; $fs=0.2;
function ldraw_lib__s__3009s01(realsolid=false) = [
// 0 ~Brick  1 x  6 without Front Face
// 0 Name: s\3009s01.dat
// 0 Author: James Jessiman
// 0 !LDRAW_ORG Subpart UPDATE 2003-03
// 0 !LICENSE Licensed under CC BY 2.0 and CC BY 4.0 : see CAreadme.txt
// 
// 0 BFC CERTIFY CCW
  [0,"BFC","CERTIFY"],
  [0,"BFC","CCW"],
// 
// 0 !HISTORY 2002-05-07 {unknown} BFC Certification
// 0 !HISTORY 2003-07-03 [Steffen] Subfiled for patterning
// 0 !HISTORY 2003-12-19 [PTadmin] Official Update 2003-03
// 0 !HISTORY 2007-08-29 [PTadmin] Header formatted for Contributor Agreement
// 0 !HISTORY 2008-07-01 [PTadmin] Official Update 2008-01
// 
// 
// 1 16 40 4 0 1 0 0 0 -5 0 0 0 1 stud3.dat
  [1,16,40,4,0,1,0,0,0,-5,0,0,0,1, ldraw_lib__stud3(realsolid)],
// 1 16 20 4 0 1 0 0 0 -5 0 0 0 1 stud3.dat
  [1,16,20,4,0,1,0,0,0,-5,0,0,0,1, ldraw_lib__stud3(realsolid)],
// 1 16 0 4 0 1 0 0 0 -5 0 0 0 1 stud3.dat
  [1,16,0,4,0,1,0,0,0,-5,0,0,0,1, ldraw_lib__stud3(realsolid)],
// 1 16 -20 4 0 1 0 0 0 -5 0 0 0 1 stud3.dat
  [1,16,-20,4,0,1,0,0,0,-5,0,0,0,1, ldraw_lib__stud3(realsolid)],
// 1 16 -40 4 0 1 0 0 0 -5 0 0 0 1 stud3.dat
  [1,16,-40,4,0,1,0,0,0,-5,0,0,0,1, ldraw_lib__stud3(realsolid)],
// 0 BFC INVERTNEXT
  [0,"BFC","INVERTNEXT"],
// 1 16 0 24 0 56 0 0 0 -20 0 0 0 6 box5.dat
  [1,16,0,24,0,56,0,0,0,-20,0,0,0,6, ldraw_lib__box5(realsolid)],
// 4 16 60 24 10 56 24 6 -56 24 6 -60 24 10
  [4,16,60,24,10,56,24,6,-56,24,6,-60,24,10],
// 4 16 -60 24 10 -56 24 6 -56 24 -6 -60 24 -10
  [4,16,-60,24,10,-56,24,6,-56,24,-6,-60,24,-10],
// 4 16 -60 24 -10 -56 24 -6 56 24 -6 60 24 -10
  [4,16,-60,24,-10,-56,24,-6,56,24,-6,60,24,-10],
// 4 16 60 24 -10 56 24 -6 56 24 6 60 24 10
  [4,16,60,24,-10,56,24,-6,56,24,6,60,24,10],
// 2 24 60 0 10 -60 0 10
  [2,24,60,0,10,-60,0,10],
// 2 24 -60 0 10 -60 0 -10
  [2,24,-60,0,10,-60,0,-10],
// 2 24 -60 0 -10 60 0 -10
  [2,24,-60,0,-10,60,0,-10],
// 2 24 60 0 -10 60 0 10
  [2,24,60,0,-10,60,0,10],
// 2 24 60 24 10 -60 24 10
  [2,24,60,24,10,-60,24,10],
// 2 24 -60 24 10 -60 24 -10
  [2,24,-60,24,10,-60,24,-10],
// 2 24 -60 24 -10 60 24 -10
  [2,24,-60,24,-10,60,24,-10],
// 2 24 60 24 -10 60 24 10
  [2,24,60,24,-10,60,24,10],
// 2 24 60 24 10 60 0 10
  [2,24,60,24,10,60,0,10],
// 2 24 -60 24 10 -60 0 10
  [2,24,-60,24,10,-60,0,10],
// 2 24 60 24 -10 60 0 -10
  [2,24,60,24,-10,60,0,-10],
// 2 24 -60 24 -10 -60 0 -10
  [2,24,-60,24,-10,-60,0,-10],
// 4 16 -60 0 -10 60 0 -10 60 0 10 -60 0 10
  [4,16,-60,0,-10,60,0,-10,60,0,10,-60,0,10],
// 4 16 -60 0 10 -60 24 10 -60 24 -10 -60 0 -10
  [4,16,-60,0,10,-60,24,10,-60,24,-10,-60,0,-10],
// 4 16 60 0 10 60 24 10 -60 24 10 -60 0 10
  [4,16,60,0,10,60,24,10,-60,24,10,-60,0,10],
// 4 16 60 0 -10 60 24 -10 60 24 10 60 0 10
  [4,16,60,0,-10,60,24,-10,60,24,10,60,0,10],
// 1 16 50 0 0 1 0 0 0 1 0 0 0 1 stud.dat
  [1,16,50,0,0,1,0,0,0,1,0,0,0,1, ldraw_lib__stud(realsolid)],
// 1 16 30 0 0 1 0 0 0 1 0 0 0 1 stud.dat
  [1,16,30,0,0,1,0,0,0,1,0,0,0,1, ldraw_lib__stud(realsolid)],
// 1 16 10 0 0 1 0 0 0 1 0 0 0 1 stud.dat
  [1,16,10,0,0,1,0,0,0,1,0,0,0,1, ldraw_lib__stud(realsolid)],
// 1 16 -10 0 0 1 0 0 0 1 0 0 0 1 stud.dat
  [1,16,-10,0,0,1,0,0,0,1,0,0,0,1, ldraw_lib__stud(realsolid)],
// 1 16 -30 0 0 1 0 0 0 1 0 0 0 1 stud.dat
  [1,16,-30,0,0,1,0,0,0,1,0,0,0,1, ldraw_lib__stud(realsolid)],
// 1 16 -50 0 0 1 0 0 0 1 0 0 0 1 stud.dat
  [1,16,-50,0,0,1,0,0,0,1,0,0,0,1, ldraw_lib__stud(realsolid)],
// 0
];
module ldraw_lib__s__3009s01(step=0, col=false, unit=2/5, alt=false, line=0.2, solid=!$preview)
    makepoly(ldraw_lib__s__3009s01(solid), step=step, col=col, unit=unit, alt=alt, line=line, solid=solid);
ldraw_lib__s__3009s01(line=0.2);
// file: ../p/box5-12.scad
use <../lib.scad>
function ldraw_lib__box5_12() = [
// 0 Box with 5 Faces without Any Edges
// 0 Name: box5-12.dat
// 0 Author: Chris Dee [cwdee]
// 0 !LDRAW_ORG Primitive UPDATE 2009-02
// 0 !LICENSE Licensed under CC BY 2.0 and CC BY 4.0 : see CAreadme.txt
// 
// 0 BFC CERTIFY CCW
  [0,"BFC","CERTIFY"],
  [0,"BFC","CCW"],
// 
// 0 !HISTORY 2009-09-03 [PTadmin] Official Update 2009-02
// 
// 
// 4 16 1 1 1 1 1 -1 -1 1 -1 -1 1 1
  [4,16,1,1,1,1,1,-1,-1,1,-1,-1,1,1],
// 4 16 -1 0 1 1 0 1 1 1 1 -1 1 1
  [4,16,-1,0,1,1,0,1,1,1,1,-1,1,1],
// 4 16 -1 0 -1 -1 0 1 -1 1 1 -1 1 -1
  [4,16,-1,0,-1,-1,0,1,-1,1,1,-1,1,-1],
// 4 16 1 0 -1 -1 0 -1 -1 1 -1 1 1 -1
  [4,16,1,0,-1,-1,0,-1,-1,1,-1,1,1,-1],
// 4 16 1 0 1 1 0 -1 1 1 -1 1 1 1
  [4,16,1,0,1,1,0,-1,1,1,-1,1,1,1],
// 0
];
module ldraw_lib__box5_12(step=0, col=false, unit=2/5, alt=false, line=0.2, solid=!$preview)
    makepoly(ldraw_lib__box5_12(), step=step, col=col, unit=unit, alt=alt, line=line, solid=solid);
ldraw_lib__box5_12(line=0.2);
// file: 3009.scad
use <../lib.scad>
use <s/3009s01.scad>
function ldraw_lib__3009() = [
// 0 Brick  1 x  6
// 0 Name: 3009.dat
// 0 Author: James Jessiman
// 0 !LDRAW_ORG Part UPDATE 2003-03
// 0 !LICENSE Licensed under CC BY 4.0 : see CAreadme.txt
// 
// 0 BFC CERTIFY CCW
  [0,"BFC","CERTIFY"],
  [0,"BFC","CCW"],
// 
// 0 !HISTORY 2001-10-26 [PTadmin] Official Update 2001-01
// 0 !HISTORY 2002-05-07 {unknown} BFC Certification
// 0 !HISTORY 2002-06-11 [PTadmin] Official Update 2002-03
// 0 !HISTORY 2003-07-03 [Steffen] Subfiled for patterning
// 0 !HISTORY 2003-12-19 [PTadmin] Official Update 2003-03
// 0 !HISTORY 2007-06-06 [PTadmin] Header formatted for Contributor Agreement
// 0 !HISTORY 2008-07-01 [PTadmin] Official Update 2008-01
// 
// 
// 1 16 0 0 0 1 0 0 0 1 0 0 0 1 s\3009s01.dat
  [1,16,0,0,0,1,0,0,0,1,0,0,0,1, ldraw_lib__s__3009s01()],
// 4 16 -60 0 -10 -60 24 -10 60 24 -10 60 0 -10
  [4,16,-60,0,-10,-60,24,-10,60,24,-10,60,0,-10],
// 0
];
module ldraw_lib__3009(step=0, col=false, unit=2/5, alt=false, line=0.2, solid=!$preview)
    makepoly(ldraw_lib__3009(), step=step, col=col, unit=unit, alt=alt, line=line, solid=solid);
ldraw_lib__3009(line=0.2);
// file: 191925b.scad
use <../lib.scad>
use <../p/box5-12.scad>
use <s/191925s01.scad>
function ldraw_lib__191925b() = [
// 0 Sticker  0.8 x  2 with White "7750"
// 0 Name: 191925b.dat
// 0 Author: Steffen [Steffen]
// 0 !LDRAW_ORG Part UPDATE 2012-01
// 0 !LICENSE Licensed under CC BY 2.0 and CC BY 4.0 : see CAreadme.txt
// 
// 0 BFC CERTIFY CCW
  [0,"BFC","CERTIFY"],
  [0,"BFC","CCW"],
// 
// 0 !HISTORY 2012-03-30 [PTadmin] Official Update 2012-01
// 
// 
// 1 16 0 -0.25 0 20 0 0 0 0.25 0 0 0 -8 box5-12.dat
  [1,16,0,-0.25,0,20,0,0,0,0.25,0,0,0,-8, ldraw_lib__box5_12()],
// 1 16 0 -0.25 -4.5 0.415 0 0 0 1 0 0 0 0.415 s\191925s01.dat
  [1,16,0,-0.25,-4.5,0.415,0,0,0,1,0,0,0,0.415, ldraw_lib__s__191925s01()],
// 4 16 -20 -0.25 8 -16.6 -0.25 5.46 16.6 -0.25 5.46 20 -0.25 8
  [4,16,-20,-0.25,8,-16.6,-0.25,5.46,16.6,-0.25,5.46,20,-0.25,8],
// 4 16 -16.6 -0.25 5.46 -20 -0.25 8 -20 -0.25 -8 -16.6 -0.25 -7.82
  [4,16,-16.6,-0.25,5.46,-20,-0.25,8,-20,-0.25,-8,-16.6,-0.25,-7.82],
// 4 16 -16.6 -0.25 -7.82 -20 -0.25 -8 20 -0.25 -8 16.6 -0.25 -7.82
  [4,16,-16.6,-0.25,-7.82,-20,-0.25,-8,20,-0.25,-8,16.6,-0.25,-7.82],
// 4 16 20 -0.25 8 16.6 -0.25 5.46 16.6 -0.25 -7.82 20 -0.25 -8
  [4,16,20,-0.25,8,16.6,-0.25,5.46,16.6,-0.25,-7.82,20,-0.25,-8],
// 0
];
module ldraw_lib__191925b(step=0, col=false, unit=2/5, alt=false, line=0.2, solid=!$preview)
    makepoly(ldraw_lib__191925b(), step=step, col=col, unit=unit, alt=alt, line=line, solid=solid);
ldraw_lib__191925b(line=0.2);
// main file
use <../lib.scad>
use <191925b.scad>
use <3009.scad>
function ldraw_lib__3009d0c() = [
// 0 Brick  1 x  6 with White "7750" Left Sticker
// 0 Name: 3009d0c.dat
// 0 Author: Takeshi Takahashi [RainbowDolphin]
// 0 !LDRAW_ORG Shortcut UPDATE 2024-07
// 0 !LICENSE Licensed under CC BY 4.0 : see CAreadme.txt
// 
// 0 BFC CERTIFY CCW
  [0,"BFC","CERTIFY"],
  [0,"BFC","CCW"],
// 
// 0 !CATEGORY Sticker Shortcut
// 0 !KEYWORDS Bricklink 3009pb217L, locomotive, Set 7750, Train
// 
// 0 !HISTORY 2024-08-26 [OrionP] Official Update 2024-07
// 
// 1 16 0 0 0 1 0 0 0 1 0 0 0 1 3009.dat
  [1,16,0,0,0,1,0,0,0,1,0,0,0,1, ldraw_lib__3009()],
// 1 16 -40 12 -10 1 0 0 0 0 -1 0 1 0 191925b.dat
  [1,16,-40,12,-10,1,0,0,0,0,-1,0,1,0, ldraw_lib__191925b()],
];
module ldraw_lib__3009d0c(step=0, col=false, unit=2/5, alt=false, line=0.2, solid=!$preview)
    makepoly(ldraw_lib__3009d0c(), step=step, col=col, unit=unit, alt=alt, line=line, solid=solid);
ldraw_lib__3009d0c(line=0.2);
